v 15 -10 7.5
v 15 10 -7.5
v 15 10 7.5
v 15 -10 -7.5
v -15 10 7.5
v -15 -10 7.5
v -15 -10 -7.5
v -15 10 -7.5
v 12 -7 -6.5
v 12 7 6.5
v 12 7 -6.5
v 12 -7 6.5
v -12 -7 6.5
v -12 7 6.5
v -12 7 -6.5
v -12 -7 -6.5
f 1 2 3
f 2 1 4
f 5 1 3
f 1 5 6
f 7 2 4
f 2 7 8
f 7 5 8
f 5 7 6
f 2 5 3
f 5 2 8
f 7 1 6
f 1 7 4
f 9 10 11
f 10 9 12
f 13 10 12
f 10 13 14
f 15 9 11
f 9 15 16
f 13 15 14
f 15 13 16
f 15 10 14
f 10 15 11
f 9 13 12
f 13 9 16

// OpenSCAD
// Example: Hollow Box with difference
$fn=64;
difference() {
    cube([30, 20, 15], center=true);
    cube([24, 14, 13], center=true);
}
